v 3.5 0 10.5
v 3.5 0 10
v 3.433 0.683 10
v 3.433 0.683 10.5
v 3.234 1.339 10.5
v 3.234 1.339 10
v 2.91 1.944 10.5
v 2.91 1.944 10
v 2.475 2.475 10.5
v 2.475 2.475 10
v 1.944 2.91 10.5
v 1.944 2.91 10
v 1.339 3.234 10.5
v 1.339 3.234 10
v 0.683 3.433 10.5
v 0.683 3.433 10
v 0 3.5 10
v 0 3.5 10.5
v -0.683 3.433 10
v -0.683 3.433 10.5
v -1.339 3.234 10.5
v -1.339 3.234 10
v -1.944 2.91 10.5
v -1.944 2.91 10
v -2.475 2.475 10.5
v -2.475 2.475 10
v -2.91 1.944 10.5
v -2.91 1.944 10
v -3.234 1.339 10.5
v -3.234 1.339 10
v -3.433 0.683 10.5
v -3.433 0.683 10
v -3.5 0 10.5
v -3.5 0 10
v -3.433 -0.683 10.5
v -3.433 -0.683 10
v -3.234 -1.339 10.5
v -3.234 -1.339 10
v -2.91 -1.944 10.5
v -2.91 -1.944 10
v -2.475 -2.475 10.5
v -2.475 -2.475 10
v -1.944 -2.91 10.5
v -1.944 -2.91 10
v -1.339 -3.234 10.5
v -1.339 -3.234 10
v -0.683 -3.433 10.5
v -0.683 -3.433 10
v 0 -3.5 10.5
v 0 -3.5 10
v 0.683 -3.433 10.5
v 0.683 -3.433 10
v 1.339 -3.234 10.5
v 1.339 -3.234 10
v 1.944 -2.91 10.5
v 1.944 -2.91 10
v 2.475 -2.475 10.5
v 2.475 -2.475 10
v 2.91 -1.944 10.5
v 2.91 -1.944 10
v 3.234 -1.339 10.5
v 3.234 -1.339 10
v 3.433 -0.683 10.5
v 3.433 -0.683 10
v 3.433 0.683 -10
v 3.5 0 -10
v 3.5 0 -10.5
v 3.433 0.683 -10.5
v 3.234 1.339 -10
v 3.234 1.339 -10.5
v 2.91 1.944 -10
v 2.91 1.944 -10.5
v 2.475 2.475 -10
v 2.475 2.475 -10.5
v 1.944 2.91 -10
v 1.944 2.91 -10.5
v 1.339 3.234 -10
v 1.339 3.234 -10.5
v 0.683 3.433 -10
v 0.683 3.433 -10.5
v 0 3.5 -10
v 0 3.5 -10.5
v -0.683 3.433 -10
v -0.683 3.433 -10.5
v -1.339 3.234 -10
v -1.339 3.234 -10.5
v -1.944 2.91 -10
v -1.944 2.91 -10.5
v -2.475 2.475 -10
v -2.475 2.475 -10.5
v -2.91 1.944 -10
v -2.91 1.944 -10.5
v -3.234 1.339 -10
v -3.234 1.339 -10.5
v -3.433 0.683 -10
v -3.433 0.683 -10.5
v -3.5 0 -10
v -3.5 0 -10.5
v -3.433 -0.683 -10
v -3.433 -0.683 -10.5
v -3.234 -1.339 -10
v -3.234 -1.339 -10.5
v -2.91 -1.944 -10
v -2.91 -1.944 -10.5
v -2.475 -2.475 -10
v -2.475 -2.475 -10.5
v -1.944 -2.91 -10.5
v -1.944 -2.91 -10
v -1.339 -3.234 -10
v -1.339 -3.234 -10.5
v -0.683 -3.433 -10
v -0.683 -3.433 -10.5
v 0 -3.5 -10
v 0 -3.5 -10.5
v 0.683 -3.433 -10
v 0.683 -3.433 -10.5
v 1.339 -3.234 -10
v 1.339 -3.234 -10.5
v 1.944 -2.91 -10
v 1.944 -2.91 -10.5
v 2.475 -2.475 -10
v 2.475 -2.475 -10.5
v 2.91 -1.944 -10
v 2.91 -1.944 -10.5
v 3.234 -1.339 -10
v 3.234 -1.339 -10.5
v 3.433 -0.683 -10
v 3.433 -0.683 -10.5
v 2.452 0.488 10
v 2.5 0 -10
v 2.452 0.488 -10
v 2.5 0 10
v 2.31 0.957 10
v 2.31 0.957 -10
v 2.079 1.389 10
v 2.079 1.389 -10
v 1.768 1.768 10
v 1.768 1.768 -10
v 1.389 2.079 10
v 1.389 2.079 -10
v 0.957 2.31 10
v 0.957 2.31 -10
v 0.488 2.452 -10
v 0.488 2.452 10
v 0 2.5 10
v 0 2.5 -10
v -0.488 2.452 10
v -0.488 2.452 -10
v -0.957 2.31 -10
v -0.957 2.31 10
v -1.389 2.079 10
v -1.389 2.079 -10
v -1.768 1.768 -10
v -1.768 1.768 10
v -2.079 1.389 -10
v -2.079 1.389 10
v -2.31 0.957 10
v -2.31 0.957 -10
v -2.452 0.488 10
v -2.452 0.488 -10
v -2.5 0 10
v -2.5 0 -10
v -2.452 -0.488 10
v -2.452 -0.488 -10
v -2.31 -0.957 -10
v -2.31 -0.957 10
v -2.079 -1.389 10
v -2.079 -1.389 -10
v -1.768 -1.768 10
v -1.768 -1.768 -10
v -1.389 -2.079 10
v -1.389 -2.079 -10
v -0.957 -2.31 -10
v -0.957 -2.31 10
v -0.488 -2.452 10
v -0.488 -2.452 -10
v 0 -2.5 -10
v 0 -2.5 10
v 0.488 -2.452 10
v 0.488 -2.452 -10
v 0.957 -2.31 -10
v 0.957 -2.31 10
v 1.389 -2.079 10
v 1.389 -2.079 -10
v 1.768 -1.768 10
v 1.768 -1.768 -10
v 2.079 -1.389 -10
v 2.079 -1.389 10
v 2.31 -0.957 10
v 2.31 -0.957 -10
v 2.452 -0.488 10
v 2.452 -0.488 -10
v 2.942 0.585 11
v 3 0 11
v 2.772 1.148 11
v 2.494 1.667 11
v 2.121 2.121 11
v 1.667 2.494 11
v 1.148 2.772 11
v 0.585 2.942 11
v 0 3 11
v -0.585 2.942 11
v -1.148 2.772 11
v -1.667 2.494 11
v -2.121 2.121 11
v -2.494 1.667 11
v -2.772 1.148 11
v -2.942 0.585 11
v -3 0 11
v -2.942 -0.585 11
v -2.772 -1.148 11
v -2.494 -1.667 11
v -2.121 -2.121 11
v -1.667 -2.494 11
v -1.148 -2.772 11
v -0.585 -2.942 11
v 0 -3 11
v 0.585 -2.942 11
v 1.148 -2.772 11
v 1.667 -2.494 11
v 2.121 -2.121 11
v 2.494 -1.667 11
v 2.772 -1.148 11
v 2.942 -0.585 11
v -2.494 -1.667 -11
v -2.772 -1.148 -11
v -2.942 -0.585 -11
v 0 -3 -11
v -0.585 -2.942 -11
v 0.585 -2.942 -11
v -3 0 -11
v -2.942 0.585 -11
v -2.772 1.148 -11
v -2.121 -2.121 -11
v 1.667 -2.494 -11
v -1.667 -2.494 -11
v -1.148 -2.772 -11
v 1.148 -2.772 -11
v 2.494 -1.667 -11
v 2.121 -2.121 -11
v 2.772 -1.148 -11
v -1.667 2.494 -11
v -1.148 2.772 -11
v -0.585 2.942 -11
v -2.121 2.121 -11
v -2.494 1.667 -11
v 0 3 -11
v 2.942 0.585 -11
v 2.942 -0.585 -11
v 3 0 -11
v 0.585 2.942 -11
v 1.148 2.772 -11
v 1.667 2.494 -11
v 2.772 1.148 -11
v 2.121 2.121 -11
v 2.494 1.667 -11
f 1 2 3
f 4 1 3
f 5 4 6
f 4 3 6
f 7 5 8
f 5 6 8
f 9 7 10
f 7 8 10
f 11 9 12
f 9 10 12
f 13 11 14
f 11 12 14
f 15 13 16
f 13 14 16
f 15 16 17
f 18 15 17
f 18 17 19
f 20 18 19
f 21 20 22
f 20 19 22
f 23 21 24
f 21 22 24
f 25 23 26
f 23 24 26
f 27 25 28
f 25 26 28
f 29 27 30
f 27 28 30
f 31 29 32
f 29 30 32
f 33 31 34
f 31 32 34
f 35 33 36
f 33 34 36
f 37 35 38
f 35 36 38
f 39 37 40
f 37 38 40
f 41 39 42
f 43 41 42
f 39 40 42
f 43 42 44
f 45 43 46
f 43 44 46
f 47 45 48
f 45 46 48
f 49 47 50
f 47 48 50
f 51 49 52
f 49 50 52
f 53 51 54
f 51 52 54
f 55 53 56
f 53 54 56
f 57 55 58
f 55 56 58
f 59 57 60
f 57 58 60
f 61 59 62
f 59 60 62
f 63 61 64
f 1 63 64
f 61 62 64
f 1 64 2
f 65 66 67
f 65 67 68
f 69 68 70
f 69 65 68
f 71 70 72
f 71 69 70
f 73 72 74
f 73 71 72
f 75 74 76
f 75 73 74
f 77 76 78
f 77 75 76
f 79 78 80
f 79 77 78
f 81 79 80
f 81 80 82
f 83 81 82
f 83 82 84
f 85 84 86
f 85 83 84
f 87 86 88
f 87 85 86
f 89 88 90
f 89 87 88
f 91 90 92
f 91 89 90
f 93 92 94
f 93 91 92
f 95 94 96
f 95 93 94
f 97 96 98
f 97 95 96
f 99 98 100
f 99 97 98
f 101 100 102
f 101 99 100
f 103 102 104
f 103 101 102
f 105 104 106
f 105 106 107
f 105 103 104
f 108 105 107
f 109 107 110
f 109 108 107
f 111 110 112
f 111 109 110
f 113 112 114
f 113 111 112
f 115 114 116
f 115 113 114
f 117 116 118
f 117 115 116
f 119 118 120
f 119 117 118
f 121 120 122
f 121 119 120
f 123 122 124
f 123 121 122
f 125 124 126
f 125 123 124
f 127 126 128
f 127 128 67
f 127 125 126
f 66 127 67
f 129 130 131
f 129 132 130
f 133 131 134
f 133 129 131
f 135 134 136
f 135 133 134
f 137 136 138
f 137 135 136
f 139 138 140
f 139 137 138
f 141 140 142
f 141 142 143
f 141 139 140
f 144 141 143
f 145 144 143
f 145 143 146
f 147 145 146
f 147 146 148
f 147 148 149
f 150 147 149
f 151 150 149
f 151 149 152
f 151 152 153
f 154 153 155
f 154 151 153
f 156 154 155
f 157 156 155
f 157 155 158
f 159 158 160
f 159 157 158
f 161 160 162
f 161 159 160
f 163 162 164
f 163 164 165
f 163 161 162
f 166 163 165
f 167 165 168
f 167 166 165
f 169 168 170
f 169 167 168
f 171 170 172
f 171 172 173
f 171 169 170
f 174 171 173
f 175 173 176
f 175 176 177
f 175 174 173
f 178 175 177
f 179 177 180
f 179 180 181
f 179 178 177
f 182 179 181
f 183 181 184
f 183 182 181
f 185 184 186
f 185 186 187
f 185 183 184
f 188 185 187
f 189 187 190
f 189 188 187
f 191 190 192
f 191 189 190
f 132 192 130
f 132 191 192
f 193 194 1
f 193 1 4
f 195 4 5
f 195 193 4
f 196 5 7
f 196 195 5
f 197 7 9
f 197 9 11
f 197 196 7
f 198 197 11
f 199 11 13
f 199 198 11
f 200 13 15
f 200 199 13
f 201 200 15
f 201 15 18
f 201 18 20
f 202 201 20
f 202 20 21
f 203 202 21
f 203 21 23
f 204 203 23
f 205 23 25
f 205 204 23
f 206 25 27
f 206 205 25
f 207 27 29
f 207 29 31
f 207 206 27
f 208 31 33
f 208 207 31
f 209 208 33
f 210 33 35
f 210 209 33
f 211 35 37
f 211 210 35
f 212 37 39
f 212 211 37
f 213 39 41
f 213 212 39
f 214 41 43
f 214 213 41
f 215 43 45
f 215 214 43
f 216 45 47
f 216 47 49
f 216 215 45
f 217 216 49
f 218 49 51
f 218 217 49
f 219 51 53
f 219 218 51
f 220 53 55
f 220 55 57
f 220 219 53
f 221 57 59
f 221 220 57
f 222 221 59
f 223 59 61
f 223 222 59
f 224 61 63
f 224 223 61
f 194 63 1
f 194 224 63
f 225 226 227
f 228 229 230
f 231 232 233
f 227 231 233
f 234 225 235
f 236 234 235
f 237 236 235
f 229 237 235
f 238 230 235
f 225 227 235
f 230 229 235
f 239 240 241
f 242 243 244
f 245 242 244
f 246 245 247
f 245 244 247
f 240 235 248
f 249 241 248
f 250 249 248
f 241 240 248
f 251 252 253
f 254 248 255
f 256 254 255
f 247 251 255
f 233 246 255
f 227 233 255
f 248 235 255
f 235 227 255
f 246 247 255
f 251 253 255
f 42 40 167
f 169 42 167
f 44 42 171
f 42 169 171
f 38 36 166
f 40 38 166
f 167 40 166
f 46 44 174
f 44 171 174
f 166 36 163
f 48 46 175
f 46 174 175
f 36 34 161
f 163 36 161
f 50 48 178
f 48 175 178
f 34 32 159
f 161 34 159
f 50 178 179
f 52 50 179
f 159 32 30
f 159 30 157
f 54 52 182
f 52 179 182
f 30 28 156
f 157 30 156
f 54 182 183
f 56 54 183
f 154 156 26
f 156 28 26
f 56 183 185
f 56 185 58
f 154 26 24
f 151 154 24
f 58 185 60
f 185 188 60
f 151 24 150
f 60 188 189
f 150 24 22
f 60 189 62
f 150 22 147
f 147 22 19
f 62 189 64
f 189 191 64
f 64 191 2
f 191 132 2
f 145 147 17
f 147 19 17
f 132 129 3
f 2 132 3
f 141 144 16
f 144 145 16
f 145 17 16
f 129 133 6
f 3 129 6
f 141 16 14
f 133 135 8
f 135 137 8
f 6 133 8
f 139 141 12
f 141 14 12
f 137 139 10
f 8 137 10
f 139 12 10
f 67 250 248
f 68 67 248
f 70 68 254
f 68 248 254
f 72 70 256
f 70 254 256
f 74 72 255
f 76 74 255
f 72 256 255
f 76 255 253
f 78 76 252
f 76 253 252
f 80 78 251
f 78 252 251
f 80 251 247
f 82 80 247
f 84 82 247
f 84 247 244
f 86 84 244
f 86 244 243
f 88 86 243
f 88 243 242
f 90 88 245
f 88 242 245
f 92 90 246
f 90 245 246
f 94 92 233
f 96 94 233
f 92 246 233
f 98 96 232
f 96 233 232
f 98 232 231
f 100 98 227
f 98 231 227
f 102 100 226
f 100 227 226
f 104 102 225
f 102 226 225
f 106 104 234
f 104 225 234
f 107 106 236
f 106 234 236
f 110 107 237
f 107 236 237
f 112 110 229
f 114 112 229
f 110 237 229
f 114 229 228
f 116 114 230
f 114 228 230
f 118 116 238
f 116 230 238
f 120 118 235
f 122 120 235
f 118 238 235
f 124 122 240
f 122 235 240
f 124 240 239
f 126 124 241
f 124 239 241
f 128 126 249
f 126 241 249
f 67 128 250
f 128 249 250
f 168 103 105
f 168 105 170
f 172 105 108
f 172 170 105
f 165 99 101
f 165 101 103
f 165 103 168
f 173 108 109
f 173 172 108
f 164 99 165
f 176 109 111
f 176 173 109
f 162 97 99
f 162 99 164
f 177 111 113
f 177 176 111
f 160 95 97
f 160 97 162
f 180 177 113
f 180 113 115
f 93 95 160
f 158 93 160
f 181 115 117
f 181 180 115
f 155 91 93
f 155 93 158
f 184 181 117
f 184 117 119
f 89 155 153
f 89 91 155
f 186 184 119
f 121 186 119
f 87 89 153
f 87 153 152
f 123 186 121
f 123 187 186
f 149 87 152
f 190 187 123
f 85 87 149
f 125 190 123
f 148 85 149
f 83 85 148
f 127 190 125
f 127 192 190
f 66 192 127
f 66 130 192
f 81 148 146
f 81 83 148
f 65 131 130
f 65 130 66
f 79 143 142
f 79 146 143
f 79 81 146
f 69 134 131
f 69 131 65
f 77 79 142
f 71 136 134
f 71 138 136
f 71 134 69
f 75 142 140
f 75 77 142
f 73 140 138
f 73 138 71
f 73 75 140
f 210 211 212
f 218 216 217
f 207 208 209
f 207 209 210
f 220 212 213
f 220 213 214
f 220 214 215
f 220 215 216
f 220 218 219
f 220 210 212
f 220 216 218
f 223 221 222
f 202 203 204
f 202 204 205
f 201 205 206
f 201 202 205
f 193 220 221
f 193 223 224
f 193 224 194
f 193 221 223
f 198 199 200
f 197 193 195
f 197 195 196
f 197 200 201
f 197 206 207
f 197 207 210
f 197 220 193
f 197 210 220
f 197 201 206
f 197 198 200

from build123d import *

# Parameters (mm, degrees)
SKETCH1_R           = 2.5
BOSS_EXTRUDE1_DEPTH = 10
SKETCH2_R           = 3.5
BOSS_EXTRUDE2_DEPTH = 1
CHAMFER1_SIZE       = 0.5


with BuildPart() as part:
    # Sketch1 → Boss-Extrude1 (new body, symmetric)
    with BuildSketch(Plane.XY):
        Circle(SKETCH1_R)
    extrude(amount=BOSS_EXTRUDE1_DEPTH, both=True)

    # Sketch2 → Boss-Extrude2 (add)
    with BuildSketch(Plane.XY.offset(10)):
        Circle(SKETCH2_R)
    boss_extrude2 = extrude(amount=BOSS_EXTRUDE2_DEPTH)

    # Mirror1: Boss-Extrude2 across plane
    add(boss_extrude2.mirror(Plane.XY))

    # Chamfer1
    chamfer1_edges = [part.edges().sort_by_distance(p)[0] for p in [
        (-3.5, 0, 11),
        (-3.5, 0, -11),
    ]]
    chamfer(chamfer1_edges, length=CHAMFER1_SIZE)


solid = part.part
